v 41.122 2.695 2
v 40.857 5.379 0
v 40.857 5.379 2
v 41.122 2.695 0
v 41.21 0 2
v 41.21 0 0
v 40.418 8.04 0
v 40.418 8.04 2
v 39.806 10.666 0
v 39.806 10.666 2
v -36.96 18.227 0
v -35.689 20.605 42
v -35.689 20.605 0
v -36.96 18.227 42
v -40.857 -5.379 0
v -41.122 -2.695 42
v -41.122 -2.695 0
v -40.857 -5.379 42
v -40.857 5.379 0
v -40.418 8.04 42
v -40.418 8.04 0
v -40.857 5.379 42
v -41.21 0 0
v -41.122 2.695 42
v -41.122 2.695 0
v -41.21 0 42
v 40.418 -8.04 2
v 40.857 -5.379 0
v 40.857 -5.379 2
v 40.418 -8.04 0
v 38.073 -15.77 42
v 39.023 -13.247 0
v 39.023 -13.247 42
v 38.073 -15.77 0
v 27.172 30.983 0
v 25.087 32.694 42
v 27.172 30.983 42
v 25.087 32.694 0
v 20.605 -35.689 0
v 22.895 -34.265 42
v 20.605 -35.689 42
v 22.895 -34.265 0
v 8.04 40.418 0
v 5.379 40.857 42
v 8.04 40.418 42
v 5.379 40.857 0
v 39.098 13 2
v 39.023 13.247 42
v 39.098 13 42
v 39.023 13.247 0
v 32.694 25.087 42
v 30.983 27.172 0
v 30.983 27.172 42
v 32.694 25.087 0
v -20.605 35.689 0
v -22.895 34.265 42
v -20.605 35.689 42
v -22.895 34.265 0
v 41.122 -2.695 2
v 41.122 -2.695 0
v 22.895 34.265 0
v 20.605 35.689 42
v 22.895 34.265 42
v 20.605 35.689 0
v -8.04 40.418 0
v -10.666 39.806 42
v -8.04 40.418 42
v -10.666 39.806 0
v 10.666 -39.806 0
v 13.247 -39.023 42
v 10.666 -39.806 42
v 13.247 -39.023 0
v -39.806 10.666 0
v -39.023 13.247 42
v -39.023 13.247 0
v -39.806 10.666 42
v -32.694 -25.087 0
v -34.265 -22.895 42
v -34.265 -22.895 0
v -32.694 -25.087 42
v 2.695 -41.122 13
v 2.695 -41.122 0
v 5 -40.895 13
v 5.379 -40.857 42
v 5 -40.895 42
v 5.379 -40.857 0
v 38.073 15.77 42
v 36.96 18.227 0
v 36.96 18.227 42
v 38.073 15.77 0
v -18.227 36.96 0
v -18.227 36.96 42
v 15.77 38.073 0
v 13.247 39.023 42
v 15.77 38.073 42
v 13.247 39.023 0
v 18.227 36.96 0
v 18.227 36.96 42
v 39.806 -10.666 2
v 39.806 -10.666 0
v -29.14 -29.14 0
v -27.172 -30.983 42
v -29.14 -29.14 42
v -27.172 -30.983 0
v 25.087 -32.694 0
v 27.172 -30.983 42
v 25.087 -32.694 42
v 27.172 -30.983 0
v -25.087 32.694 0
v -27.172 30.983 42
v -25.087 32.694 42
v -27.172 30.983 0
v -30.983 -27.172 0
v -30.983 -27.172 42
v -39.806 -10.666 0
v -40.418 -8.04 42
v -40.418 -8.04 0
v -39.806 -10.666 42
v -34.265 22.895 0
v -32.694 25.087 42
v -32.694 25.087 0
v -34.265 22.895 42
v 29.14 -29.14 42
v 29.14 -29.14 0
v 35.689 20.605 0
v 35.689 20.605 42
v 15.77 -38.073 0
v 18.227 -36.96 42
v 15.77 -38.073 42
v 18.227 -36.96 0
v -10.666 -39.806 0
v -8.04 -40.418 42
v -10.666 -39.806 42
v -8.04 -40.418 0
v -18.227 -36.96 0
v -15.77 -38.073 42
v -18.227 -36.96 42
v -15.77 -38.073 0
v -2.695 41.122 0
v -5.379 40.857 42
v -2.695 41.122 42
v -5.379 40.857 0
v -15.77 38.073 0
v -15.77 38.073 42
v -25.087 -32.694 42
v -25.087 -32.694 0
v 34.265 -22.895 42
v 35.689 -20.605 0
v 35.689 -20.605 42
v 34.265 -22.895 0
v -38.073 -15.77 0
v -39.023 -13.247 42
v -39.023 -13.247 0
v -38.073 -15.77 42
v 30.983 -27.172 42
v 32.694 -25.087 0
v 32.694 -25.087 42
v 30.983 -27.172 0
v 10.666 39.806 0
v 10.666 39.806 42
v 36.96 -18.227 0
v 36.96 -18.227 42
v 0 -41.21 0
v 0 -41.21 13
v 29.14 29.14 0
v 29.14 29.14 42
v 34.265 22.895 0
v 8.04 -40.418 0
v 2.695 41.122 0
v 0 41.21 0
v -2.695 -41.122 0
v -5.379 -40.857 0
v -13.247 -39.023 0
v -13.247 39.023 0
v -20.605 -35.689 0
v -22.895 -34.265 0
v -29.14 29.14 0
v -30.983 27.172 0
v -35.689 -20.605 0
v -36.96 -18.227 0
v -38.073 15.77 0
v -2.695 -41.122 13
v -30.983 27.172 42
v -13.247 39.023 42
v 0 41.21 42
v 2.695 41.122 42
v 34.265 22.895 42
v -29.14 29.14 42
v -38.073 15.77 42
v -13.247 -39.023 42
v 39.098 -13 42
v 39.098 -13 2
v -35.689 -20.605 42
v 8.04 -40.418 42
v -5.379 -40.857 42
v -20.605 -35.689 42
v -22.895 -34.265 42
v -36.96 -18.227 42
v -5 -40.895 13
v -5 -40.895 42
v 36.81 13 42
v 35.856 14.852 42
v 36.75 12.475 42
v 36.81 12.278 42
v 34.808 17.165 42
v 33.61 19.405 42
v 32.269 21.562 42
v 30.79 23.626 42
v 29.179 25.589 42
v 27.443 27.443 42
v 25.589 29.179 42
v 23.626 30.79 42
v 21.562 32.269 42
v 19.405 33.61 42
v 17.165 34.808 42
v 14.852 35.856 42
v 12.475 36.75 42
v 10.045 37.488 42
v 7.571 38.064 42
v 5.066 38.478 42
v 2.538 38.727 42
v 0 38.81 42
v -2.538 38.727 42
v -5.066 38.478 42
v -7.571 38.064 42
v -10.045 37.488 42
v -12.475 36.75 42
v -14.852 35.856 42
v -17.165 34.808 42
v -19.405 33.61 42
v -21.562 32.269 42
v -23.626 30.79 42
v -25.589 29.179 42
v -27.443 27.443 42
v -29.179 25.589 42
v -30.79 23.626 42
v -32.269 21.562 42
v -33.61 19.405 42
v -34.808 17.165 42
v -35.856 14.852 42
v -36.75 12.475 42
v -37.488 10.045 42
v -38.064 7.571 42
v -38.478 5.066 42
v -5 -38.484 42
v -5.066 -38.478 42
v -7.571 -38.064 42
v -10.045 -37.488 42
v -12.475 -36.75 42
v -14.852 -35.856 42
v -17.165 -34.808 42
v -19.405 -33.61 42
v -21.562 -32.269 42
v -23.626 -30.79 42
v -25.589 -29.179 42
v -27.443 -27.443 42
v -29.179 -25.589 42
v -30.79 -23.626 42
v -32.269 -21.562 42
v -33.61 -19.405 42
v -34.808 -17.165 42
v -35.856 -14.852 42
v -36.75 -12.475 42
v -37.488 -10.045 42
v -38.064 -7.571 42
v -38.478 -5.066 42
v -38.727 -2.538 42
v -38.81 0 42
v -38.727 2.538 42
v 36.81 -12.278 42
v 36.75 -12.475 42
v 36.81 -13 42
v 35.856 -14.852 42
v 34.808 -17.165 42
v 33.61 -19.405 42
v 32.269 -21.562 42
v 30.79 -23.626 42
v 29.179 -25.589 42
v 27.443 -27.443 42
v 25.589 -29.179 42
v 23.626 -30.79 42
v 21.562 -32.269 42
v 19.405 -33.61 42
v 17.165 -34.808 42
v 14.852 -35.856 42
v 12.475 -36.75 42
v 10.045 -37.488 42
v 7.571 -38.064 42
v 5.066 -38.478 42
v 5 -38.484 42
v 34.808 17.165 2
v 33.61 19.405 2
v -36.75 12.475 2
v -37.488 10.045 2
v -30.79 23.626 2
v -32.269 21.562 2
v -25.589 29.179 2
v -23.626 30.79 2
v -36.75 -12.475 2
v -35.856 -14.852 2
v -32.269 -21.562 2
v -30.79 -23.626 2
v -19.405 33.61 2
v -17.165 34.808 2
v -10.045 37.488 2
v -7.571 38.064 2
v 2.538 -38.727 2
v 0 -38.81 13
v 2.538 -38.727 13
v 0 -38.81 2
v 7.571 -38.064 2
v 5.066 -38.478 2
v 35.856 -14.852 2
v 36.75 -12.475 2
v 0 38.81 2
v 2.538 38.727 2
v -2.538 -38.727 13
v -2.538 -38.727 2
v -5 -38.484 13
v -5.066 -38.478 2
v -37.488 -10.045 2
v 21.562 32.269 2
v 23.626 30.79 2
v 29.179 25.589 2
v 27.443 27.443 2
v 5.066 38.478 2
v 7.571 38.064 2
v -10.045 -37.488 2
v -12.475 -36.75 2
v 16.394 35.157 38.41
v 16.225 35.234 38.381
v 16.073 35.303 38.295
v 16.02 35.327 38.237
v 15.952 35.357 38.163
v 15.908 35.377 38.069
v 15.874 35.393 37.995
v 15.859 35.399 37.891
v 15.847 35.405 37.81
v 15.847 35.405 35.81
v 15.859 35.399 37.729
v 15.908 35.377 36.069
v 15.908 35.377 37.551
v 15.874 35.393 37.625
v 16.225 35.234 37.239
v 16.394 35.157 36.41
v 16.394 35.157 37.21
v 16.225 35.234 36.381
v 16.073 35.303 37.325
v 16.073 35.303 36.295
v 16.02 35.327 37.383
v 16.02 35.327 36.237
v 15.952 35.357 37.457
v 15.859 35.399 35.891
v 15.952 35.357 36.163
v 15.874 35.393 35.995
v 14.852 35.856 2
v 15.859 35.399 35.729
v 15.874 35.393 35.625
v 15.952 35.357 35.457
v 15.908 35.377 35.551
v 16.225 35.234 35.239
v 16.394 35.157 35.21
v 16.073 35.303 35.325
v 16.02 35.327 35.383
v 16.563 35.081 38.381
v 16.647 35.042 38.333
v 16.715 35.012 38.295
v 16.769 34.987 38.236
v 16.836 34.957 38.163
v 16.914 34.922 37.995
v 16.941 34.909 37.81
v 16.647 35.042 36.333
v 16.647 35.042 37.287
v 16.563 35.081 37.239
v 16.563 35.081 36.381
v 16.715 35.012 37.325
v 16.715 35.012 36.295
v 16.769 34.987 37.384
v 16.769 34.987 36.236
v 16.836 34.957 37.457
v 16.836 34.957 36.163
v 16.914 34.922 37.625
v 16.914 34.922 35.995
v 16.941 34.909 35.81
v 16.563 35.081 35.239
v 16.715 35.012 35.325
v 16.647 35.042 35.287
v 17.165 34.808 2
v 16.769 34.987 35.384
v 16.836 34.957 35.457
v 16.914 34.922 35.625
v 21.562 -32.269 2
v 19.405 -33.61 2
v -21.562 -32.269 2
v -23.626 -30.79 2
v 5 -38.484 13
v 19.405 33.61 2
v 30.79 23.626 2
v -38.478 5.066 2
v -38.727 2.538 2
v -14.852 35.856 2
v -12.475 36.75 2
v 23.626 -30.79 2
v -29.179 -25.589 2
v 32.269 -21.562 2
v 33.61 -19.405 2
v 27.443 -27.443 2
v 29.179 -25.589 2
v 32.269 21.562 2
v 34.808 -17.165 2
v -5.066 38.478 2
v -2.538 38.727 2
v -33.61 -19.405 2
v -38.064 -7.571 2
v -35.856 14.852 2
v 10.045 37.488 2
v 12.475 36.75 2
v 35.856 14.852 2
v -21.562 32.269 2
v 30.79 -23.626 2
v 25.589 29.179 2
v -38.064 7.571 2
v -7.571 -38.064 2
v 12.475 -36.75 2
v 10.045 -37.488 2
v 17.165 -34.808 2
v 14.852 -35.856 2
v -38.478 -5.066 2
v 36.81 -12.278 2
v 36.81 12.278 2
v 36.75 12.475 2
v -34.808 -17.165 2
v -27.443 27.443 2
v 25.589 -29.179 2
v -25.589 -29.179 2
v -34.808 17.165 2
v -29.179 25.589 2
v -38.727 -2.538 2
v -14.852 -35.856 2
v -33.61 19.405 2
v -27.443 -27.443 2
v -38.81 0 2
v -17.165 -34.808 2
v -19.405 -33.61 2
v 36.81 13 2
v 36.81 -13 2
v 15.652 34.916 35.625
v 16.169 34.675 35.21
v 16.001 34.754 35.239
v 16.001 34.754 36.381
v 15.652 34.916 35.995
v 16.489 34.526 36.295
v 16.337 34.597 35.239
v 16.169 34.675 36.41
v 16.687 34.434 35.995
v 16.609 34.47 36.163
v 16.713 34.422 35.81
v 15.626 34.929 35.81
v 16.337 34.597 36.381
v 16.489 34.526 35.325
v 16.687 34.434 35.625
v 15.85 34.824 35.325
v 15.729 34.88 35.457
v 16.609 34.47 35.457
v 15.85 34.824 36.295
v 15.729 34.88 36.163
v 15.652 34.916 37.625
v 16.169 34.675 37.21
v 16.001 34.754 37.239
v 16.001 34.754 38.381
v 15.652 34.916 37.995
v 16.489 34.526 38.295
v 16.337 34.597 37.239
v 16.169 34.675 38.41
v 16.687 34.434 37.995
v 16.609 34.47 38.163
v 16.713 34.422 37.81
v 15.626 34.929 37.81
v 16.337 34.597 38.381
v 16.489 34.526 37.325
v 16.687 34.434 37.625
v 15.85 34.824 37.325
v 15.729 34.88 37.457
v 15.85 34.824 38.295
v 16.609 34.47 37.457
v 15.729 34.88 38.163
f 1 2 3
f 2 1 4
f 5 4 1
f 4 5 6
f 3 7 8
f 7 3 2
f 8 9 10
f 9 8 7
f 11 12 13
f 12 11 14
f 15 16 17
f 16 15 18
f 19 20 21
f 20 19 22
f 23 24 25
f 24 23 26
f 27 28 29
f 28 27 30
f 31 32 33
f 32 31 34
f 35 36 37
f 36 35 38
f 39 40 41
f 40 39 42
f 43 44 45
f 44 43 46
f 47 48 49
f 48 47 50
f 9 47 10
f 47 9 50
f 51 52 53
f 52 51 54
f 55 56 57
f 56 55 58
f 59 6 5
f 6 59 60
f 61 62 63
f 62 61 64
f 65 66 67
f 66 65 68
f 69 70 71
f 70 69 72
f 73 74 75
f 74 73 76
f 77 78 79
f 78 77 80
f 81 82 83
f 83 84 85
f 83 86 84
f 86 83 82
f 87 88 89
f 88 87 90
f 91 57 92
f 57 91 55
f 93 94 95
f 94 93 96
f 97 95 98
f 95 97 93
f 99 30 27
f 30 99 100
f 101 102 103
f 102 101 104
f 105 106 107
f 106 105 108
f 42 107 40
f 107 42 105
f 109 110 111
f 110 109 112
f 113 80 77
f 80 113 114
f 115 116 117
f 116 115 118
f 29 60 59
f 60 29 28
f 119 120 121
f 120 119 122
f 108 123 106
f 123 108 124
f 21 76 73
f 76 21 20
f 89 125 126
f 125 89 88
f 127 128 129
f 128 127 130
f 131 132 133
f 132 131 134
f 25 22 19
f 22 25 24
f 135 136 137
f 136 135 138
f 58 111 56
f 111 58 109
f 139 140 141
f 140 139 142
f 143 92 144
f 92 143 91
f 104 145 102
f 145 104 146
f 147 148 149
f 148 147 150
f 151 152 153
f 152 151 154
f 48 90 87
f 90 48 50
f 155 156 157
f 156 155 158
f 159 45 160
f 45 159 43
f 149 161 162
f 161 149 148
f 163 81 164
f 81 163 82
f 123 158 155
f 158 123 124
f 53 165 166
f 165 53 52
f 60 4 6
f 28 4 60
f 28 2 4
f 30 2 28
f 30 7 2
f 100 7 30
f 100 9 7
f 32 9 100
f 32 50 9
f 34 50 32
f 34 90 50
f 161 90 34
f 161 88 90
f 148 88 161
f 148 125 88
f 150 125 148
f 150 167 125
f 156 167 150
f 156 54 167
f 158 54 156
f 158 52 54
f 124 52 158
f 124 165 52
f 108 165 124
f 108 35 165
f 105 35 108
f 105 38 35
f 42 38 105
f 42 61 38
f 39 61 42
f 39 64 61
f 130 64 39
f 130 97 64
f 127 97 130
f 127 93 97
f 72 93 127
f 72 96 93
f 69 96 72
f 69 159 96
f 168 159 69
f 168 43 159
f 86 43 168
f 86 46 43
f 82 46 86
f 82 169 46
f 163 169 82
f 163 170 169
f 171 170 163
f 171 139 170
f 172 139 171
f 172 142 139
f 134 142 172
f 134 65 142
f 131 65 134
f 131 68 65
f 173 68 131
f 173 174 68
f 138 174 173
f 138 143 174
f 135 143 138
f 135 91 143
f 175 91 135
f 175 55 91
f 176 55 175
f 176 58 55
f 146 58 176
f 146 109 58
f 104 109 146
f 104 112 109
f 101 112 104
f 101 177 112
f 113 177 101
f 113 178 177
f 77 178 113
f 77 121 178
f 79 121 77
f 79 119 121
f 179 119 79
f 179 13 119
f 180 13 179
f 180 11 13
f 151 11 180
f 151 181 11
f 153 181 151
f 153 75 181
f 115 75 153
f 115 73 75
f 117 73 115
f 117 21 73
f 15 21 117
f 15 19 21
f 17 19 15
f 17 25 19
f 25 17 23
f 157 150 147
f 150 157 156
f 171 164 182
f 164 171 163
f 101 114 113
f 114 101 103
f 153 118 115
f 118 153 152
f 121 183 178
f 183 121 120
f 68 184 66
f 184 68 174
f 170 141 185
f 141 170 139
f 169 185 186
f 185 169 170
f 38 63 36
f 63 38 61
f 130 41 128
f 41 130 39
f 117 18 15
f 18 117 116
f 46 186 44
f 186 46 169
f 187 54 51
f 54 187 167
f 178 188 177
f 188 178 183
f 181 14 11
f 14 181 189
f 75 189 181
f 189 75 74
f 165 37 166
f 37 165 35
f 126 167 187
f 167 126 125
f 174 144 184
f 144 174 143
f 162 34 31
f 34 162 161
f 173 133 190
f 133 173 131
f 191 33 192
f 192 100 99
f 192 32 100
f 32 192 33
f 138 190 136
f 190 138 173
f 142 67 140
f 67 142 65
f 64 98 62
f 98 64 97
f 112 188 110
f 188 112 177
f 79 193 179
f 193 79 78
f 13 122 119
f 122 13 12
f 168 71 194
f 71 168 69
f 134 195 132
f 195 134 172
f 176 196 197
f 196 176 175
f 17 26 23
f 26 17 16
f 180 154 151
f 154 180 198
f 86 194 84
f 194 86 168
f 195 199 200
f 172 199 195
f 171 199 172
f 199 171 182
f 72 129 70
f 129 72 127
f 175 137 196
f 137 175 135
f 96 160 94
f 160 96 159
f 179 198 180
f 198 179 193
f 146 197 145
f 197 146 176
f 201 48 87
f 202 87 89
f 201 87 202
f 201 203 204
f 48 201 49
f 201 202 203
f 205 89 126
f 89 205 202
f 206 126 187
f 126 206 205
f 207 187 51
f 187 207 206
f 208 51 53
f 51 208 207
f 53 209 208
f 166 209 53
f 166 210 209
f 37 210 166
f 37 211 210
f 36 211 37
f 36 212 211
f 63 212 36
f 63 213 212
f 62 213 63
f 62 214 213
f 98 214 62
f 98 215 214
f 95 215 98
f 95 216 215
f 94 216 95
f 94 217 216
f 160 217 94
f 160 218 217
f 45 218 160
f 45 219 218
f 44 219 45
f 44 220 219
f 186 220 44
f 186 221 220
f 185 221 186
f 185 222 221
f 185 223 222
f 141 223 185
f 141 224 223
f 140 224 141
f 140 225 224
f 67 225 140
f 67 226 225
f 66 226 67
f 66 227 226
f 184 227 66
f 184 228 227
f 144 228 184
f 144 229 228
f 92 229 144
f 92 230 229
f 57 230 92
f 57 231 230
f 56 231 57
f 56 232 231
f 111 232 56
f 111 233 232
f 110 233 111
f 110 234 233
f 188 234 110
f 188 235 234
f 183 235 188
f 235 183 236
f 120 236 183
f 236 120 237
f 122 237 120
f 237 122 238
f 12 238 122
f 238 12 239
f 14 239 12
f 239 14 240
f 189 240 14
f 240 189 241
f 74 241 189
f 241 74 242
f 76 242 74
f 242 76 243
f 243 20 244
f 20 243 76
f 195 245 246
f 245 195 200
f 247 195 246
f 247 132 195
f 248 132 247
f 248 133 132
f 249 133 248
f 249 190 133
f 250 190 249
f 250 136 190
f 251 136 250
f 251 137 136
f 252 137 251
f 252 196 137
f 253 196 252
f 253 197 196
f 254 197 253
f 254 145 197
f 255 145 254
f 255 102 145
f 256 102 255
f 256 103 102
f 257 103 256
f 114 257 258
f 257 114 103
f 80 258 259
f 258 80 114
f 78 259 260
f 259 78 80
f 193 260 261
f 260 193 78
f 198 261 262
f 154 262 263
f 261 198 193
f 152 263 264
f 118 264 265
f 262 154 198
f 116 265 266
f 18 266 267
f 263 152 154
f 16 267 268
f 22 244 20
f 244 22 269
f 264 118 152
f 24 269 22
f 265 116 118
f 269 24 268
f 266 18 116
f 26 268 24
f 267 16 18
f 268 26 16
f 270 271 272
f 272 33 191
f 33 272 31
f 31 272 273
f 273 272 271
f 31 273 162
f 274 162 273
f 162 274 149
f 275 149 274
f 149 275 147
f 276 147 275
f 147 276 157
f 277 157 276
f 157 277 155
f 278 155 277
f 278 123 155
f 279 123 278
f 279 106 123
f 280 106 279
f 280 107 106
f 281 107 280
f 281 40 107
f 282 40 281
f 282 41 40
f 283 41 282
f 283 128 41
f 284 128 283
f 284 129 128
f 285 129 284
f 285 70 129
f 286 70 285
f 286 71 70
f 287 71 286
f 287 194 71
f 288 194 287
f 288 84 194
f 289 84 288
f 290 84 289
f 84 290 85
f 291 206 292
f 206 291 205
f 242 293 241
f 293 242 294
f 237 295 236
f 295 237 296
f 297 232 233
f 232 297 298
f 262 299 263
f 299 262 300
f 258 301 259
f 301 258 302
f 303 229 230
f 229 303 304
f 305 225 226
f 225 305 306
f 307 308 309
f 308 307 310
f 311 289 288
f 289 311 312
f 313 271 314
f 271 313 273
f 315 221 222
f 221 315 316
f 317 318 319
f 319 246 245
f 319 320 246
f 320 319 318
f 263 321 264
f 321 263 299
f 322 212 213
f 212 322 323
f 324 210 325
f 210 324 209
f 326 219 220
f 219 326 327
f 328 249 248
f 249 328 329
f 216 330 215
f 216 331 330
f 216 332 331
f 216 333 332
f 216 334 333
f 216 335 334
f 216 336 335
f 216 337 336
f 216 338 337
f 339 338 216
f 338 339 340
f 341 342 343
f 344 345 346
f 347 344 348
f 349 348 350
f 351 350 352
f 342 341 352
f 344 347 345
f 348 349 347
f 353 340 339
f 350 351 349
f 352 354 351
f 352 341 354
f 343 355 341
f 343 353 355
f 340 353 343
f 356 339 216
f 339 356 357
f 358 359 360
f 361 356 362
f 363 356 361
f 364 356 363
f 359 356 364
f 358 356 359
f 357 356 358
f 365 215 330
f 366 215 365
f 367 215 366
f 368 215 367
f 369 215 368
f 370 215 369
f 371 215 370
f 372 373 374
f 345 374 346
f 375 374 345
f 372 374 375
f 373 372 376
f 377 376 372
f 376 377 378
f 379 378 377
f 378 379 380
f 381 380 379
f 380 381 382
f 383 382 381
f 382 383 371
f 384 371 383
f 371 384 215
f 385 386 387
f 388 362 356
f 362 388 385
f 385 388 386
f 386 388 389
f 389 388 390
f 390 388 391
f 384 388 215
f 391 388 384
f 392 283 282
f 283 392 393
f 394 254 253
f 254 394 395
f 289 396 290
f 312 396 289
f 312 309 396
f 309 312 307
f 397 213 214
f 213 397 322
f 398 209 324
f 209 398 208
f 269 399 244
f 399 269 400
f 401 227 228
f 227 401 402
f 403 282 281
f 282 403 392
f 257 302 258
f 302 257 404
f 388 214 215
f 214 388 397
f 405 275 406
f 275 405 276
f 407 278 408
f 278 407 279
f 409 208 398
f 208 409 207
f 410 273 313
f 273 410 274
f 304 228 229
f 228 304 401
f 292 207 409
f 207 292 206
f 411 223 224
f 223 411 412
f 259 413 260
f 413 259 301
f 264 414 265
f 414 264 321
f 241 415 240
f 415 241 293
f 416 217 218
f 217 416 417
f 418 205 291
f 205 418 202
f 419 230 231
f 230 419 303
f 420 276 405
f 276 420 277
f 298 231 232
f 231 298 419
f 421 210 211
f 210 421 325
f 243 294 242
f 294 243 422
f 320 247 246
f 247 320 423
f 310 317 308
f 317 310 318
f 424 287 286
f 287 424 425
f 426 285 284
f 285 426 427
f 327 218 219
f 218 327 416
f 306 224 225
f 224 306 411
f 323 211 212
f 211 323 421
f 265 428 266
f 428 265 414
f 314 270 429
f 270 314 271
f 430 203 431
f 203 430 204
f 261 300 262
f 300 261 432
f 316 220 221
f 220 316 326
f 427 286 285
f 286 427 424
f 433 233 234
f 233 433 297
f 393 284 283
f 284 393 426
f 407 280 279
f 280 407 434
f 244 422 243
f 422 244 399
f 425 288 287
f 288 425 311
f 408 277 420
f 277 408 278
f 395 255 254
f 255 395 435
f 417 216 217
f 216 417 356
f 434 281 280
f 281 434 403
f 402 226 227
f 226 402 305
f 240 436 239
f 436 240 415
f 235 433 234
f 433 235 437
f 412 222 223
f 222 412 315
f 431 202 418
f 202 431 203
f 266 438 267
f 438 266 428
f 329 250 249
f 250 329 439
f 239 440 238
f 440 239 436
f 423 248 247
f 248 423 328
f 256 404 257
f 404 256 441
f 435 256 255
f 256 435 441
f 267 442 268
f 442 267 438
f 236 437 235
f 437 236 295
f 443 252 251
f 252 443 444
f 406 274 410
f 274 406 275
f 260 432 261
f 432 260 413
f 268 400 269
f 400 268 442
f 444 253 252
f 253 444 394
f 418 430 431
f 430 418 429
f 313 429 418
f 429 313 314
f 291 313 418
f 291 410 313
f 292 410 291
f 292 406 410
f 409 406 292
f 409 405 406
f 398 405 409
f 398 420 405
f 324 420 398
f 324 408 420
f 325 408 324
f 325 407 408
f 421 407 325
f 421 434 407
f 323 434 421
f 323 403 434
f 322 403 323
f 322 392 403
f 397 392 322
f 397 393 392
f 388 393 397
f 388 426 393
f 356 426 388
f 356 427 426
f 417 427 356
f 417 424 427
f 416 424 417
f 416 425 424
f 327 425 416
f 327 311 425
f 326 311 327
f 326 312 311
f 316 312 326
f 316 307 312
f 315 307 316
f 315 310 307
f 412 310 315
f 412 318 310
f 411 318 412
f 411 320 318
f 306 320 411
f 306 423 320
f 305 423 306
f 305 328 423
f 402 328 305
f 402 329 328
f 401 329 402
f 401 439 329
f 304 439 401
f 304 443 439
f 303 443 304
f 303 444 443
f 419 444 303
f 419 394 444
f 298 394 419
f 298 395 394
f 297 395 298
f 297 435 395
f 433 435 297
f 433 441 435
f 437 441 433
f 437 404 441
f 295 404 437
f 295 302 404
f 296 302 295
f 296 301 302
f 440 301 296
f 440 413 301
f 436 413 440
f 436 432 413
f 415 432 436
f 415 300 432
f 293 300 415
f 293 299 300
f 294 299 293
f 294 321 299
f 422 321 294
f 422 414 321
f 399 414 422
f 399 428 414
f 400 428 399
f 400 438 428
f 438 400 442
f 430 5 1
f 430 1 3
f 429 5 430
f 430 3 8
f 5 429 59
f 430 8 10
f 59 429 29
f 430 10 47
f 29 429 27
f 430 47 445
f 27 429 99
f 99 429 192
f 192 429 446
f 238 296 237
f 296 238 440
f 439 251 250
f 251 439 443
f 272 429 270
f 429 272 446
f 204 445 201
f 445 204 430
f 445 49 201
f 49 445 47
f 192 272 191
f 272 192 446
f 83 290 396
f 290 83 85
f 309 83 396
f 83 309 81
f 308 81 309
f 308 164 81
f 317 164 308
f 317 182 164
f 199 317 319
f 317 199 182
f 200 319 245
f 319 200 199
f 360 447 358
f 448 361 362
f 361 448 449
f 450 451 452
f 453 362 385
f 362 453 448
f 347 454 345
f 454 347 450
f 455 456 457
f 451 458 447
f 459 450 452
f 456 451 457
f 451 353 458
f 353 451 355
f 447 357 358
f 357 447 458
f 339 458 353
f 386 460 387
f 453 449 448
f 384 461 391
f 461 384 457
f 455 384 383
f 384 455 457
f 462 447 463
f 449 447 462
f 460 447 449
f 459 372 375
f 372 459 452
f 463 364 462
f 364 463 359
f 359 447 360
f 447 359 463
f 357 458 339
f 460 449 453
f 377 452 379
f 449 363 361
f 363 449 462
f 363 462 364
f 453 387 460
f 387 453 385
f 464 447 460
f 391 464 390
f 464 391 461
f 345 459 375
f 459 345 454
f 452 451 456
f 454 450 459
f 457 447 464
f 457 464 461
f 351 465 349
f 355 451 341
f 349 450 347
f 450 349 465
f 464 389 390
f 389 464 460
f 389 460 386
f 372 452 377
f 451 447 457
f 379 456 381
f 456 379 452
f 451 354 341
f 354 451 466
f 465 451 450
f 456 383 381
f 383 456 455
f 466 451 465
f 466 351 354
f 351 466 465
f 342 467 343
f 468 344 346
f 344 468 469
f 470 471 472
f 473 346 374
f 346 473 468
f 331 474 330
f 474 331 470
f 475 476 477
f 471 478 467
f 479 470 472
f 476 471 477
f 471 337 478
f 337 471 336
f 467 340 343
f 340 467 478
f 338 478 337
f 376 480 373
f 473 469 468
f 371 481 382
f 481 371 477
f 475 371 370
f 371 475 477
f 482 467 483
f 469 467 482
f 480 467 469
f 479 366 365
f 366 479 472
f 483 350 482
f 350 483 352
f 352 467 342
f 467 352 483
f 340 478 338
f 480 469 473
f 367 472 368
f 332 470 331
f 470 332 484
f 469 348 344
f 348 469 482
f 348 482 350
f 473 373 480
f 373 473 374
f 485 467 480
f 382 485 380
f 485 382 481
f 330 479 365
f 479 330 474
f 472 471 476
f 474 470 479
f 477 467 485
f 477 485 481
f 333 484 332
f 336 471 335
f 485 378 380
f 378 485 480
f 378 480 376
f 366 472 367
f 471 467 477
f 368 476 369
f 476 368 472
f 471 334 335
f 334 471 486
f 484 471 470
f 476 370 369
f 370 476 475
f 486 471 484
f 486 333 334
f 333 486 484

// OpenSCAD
// =====================================================================
// Jig 27 - 22N704V160 fan: drop-in cup + port go-ring (two printed parts)
// =====================================================================
// Prints TWICE (select with part=). Checks the PURCHASED fan with no
// caliper:
//   part="cup" - FOOTPRINT: body must pass the cup bore D77.62 down to
//     the floor (id = measured y extent 77.42 + 0.1/side; jam/rock =
//     body wider than modeled => record, widen cup_id). HEIGHT: resting
//     on the floor, the top face must sit at the NOMINAL rib (floor+
//     33.81) and stay under the MAX rib (+2.0) - sight across the two
//     inner ribs. The +x rim notch clears the exit-duct bulge region,
//     the -y notch leaves wire room; try the cup rotated 180 deg if the
//     first orientation jams to tell which side is proud.
//   part="ring" - PORT: invert the fan, drop the ring into the top
//     inlet bore (ring OD 26.40 into the measured bore D27.90, land
//     D28.98 seats on the table). Flush seat = bore as modeled; no-drop
//     or visible gap ring-to-bore = off-size port => record.
//     Centering check: with the ring standing on the table, lower the
//     bore over it; the bore must swallow the ring without pushing it
//     off-center.
// All part dims are the one-cad-measured values (provenance in
// envelope-22n704v160.scad header); clearances are the only added
// constants, marked [E]. A pass here validates THIS MODEL against the
// PART - it is not datasheet truth.
// License: CC BY-SA 4.0. Units: mm.

/* [Hidden] */
$fn = 96;

/* [Which part to render] */
// "cup"  drop-in footprint+height gauge
// "ring" loose port go-ring
part = "cup"; // ["cup", "ring"]

/* [Fan measured dims - keep in sync with envelope-22n704v160.scad] */
body_d      = 75.72;   // scroll wall OD [M]
lobe_pair   = 77.42;   // y extent incl. inlet-side lobes [M: +-38.71]
height_tot  = 33.81;   // z stack [M]
port_bore   = 27.90;   // top inlet bore under the land [M]

/* [Jig constants - [E] print-clearance choices] */
cup_id      = lobe_pair + 0.20; // 77.62 bore
cup_wall    = 2.4;
floor_t     = 2.0;
cup_h       = 40.0;    // wall height above the floor top
mark_hi     = 2.0;     // max mark = nominal + this
rib_d       = 1.2;     // sighting rib diameter
rib_arc_deg = 50;      // rib angular span, centered +y ... +x
ring_od     = 26.40;   // port go-ring (0.75/side under bore 27.9)
ring_h      = 8.0;
ring_wall   = 0.7;
notch_x_w   = 26.0;     // +x rim notch width (duct-relief), centered +x [E]
notch2_w    = 10.0;     // -y wire relief [E]

// ---- cup: floor + wall, inner sighting ribs at nominal/max height
module cup() {
    difference() {
        union() {
            cylinder(d = cup_id + 2*cup_wall, h = floor_t);
            translate([0, 0, floor_t])
                cylinder(d = cup_id + 2*cup_wall, h = cup_h);
        }
        translate([0, 0, floor_t]) cylinder(d = cup_id, h = cup_h + 2);
        // +x rim notch, full height above floor
        translate([cup_id/2 + cup_wall, 0, floor_t + cup_h/2 + 2])
            cube([2*cup_wall + 4, notch_x_w, cup_h + 4], center = true);
        // -y wire relief, upper half only
        translate([0, -(cup_id/2 + cup_wall), floor_t + 26])
            cube([notch2_w, 2*cup_wall + 4, 30], center = true);
    }
    // sighting ribs (protrude into the bore, thin)
    mark_rib(floor_t + height_tot);
    mark_rib(floor_t + height_tot + mark_hi);
}

module mark_rib(z)
    rotate([0, 0, 90 - rib_arc_deg/2])
        translate([cup_id/2 - rib_d/2 + 0.05, 0, z])
            rotate([0, 90, 0])
                cylinder(d = rib_d, h = rib_d, $fn = 20);

// ---- loose port ring
module port_ring()
    difference() {
        cylinder(d = ring_od, h = ring_h);
        translate([0, 0, -1])
            cylinder(d = ring_od - 2*ring_wall, h = ring_h + 2);
    }

if (part == "cup") cup();
else port_ring();
echo(str("[jig27] part=", part, " cup_id=", cup_id,
         " ribs at floor+", height_tot, "/", height_tot + mark_hi,
         " | ring OD ", ring_od, " vs bore ", port_bore));
